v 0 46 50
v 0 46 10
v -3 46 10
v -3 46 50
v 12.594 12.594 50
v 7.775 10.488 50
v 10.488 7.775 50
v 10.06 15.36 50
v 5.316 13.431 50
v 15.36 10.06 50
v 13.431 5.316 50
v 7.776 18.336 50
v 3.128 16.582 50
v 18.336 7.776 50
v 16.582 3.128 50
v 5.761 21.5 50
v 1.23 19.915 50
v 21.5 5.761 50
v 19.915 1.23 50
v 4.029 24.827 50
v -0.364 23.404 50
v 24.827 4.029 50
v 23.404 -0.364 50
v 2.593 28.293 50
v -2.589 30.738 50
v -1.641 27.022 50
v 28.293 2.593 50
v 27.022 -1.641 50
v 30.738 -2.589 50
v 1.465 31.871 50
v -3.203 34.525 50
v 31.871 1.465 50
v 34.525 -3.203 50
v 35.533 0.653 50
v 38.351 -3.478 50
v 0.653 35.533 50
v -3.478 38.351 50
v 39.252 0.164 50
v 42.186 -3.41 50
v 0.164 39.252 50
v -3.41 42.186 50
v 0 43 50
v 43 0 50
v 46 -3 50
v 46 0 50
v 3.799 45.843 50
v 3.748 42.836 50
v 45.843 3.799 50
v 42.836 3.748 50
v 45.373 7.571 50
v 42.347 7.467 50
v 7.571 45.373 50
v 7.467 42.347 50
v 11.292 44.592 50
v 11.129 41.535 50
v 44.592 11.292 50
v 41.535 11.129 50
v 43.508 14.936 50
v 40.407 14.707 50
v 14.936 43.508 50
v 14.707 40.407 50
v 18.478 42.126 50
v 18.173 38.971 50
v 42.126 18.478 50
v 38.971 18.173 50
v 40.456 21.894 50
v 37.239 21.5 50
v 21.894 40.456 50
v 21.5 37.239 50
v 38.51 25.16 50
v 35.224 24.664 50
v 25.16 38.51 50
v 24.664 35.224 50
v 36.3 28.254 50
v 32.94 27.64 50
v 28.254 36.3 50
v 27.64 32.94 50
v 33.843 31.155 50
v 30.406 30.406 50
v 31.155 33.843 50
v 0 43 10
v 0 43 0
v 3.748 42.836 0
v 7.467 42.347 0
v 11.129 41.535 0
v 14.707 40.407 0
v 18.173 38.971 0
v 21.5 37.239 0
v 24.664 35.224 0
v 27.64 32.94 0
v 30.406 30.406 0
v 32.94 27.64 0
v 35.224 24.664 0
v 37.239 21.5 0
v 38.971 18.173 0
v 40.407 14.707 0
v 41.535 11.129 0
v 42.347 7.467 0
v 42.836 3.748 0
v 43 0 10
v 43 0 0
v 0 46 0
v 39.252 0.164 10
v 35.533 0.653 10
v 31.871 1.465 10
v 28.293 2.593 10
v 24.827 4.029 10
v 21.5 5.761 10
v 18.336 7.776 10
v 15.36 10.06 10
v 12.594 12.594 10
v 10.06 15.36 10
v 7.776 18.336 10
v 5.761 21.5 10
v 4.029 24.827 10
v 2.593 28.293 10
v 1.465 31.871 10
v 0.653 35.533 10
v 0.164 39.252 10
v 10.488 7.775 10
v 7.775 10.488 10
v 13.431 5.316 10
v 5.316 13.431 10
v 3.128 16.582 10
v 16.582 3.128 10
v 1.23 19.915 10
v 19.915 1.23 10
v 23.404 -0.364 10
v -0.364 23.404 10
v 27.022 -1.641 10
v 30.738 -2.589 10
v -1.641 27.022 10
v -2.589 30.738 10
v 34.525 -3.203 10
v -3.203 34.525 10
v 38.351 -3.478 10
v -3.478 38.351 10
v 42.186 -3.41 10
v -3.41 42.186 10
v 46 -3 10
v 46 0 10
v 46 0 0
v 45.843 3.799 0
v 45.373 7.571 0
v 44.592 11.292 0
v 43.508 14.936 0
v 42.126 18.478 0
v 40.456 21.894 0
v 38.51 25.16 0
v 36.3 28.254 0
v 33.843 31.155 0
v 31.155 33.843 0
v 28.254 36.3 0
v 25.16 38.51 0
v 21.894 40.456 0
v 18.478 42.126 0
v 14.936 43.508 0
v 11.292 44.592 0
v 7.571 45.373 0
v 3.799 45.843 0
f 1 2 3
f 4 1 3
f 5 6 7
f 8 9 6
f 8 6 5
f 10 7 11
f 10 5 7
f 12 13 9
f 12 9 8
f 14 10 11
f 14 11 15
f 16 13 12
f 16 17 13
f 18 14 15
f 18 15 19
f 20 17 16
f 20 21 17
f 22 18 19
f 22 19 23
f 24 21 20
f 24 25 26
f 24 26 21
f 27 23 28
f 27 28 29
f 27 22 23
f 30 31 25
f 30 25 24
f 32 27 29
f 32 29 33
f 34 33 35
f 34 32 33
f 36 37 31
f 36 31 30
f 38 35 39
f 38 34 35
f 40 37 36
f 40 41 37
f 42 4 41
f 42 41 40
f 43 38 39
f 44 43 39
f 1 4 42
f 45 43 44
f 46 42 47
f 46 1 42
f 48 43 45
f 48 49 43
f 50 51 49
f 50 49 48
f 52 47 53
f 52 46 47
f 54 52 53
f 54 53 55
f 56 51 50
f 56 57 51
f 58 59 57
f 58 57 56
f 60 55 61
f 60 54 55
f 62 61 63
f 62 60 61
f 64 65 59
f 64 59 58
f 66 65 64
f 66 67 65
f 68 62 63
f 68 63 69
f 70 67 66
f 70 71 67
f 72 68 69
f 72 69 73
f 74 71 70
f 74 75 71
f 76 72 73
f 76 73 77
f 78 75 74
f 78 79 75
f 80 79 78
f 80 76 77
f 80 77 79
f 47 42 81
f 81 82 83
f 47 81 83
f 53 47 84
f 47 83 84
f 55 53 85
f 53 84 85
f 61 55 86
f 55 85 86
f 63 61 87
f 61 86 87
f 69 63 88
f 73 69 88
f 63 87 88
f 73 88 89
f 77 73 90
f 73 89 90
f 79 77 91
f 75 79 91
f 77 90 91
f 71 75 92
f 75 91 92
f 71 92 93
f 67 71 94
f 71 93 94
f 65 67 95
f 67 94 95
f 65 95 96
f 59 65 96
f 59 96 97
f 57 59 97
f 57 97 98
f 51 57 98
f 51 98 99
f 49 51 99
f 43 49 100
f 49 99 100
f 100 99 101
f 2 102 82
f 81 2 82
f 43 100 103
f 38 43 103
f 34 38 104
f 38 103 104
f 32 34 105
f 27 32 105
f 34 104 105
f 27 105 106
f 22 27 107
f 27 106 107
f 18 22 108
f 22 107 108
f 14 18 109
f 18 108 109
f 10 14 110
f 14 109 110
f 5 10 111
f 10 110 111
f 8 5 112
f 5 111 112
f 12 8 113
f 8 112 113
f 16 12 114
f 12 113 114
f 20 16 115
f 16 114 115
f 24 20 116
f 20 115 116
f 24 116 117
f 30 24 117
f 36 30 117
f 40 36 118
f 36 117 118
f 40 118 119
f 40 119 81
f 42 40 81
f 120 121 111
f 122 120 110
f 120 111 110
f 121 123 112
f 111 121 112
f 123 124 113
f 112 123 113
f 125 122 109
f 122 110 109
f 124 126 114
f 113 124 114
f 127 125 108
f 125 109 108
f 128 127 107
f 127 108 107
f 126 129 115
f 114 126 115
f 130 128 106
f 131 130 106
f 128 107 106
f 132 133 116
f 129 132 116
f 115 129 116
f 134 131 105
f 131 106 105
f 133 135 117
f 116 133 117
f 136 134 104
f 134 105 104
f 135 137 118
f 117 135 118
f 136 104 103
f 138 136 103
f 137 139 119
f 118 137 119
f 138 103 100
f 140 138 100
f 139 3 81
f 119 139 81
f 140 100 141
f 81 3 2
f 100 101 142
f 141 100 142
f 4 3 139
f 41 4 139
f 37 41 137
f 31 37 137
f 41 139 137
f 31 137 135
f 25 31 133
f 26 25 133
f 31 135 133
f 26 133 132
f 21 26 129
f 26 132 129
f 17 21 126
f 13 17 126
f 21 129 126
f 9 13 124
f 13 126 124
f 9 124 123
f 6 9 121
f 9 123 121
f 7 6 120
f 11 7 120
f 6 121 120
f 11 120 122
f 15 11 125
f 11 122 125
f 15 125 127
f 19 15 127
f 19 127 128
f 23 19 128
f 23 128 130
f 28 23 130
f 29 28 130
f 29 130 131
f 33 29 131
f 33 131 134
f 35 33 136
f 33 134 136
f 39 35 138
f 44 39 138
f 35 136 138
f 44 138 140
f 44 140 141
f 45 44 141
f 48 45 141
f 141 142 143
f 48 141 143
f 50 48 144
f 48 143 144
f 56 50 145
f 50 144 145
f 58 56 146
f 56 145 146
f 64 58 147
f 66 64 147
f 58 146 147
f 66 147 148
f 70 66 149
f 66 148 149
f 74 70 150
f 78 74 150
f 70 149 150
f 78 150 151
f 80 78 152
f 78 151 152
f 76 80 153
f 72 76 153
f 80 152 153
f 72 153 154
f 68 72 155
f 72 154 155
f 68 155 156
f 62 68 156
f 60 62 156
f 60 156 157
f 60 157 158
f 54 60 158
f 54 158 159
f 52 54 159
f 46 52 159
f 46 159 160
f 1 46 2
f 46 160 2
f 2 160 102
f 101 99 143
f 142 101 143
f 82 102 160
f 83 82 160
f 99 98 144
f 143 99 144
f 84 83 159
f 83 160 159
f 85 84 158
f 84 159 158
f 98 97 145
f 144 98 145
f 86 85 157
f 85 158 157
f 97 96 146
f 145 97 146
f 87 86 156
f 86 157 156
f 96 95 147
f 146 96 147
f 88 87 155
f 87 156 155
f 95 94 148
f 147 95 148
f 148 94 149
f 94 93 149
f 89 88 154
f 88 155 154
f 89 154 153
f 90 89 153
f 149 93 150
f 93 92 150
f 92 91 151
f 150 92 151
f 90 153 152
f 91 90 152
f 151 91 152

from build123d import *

# Parameters (mm, degrees)
BOSS_EXTRUDE1_DEPTH = 10
BOSS_EXTRUDE2_DEPTH = 40
BOSS_EXTRUDE3_DEPTH = 40


with BuildPart() as part:
    # Sketch1 → Boss-Extrude1 (new body)
    with BuildSketch(Plane.XY):
        with BuildLine():
            Line((0, 46), (0, 43))
            ThreePointArc((0, 43), (30.405591591, 30.405591591), (43, 0))
            Line((43, 0), (46, 0))
            ThreePointArc((46, 0), (32.526911935, 32.526911935), (0, 46))
        make_face()
    extrude(amount=BOSS_EXTRUDE1_DEPTH)



with BuildPart() as body_2:
    # Sketch3 → Boss-Extrude2 (new body)
    with BuildSketch(Plane.XY.offset(10)):
        with BuildLine():
            Line((0, 46), (-3, 46))
            ThreePointArc((-3, 46), (9.101351514, 9.101351514), (46, -3))
            Line((46, -3), (46, 0))
            Line((46, 0), (43, 0))
            ThreePointArc((43, 0), (12.594408409, 12.594408409), (0, 43))
            Line((0, 43), (0, 46))
        make_face()
    extrude(amount=BOSS_EXTRUDE2_DEPTH)


with BuildPart() as part_1:
    add(part.part)

    add(body_2.part)  # Boss-Extrude3 merges body 2
    # Sketch4 → Boss-Extrude3 (add)
    with BuildSketch(Plane.XY.offset(10)):
        with BuildLine():
            Line((0, 46), (0, 43))
            ThreePointArc((0, 43), (30.405591591, 30.405591591), (43, 0))
            Line((43, 0), (46, 0))
            ThreePointArc((46, 0), (32.526911935, 32.526911935), (0, 46))
        make_face()
    extrude(amount=BOSS_EXTRUDE3_DEPTH)


solid = part_1.part
